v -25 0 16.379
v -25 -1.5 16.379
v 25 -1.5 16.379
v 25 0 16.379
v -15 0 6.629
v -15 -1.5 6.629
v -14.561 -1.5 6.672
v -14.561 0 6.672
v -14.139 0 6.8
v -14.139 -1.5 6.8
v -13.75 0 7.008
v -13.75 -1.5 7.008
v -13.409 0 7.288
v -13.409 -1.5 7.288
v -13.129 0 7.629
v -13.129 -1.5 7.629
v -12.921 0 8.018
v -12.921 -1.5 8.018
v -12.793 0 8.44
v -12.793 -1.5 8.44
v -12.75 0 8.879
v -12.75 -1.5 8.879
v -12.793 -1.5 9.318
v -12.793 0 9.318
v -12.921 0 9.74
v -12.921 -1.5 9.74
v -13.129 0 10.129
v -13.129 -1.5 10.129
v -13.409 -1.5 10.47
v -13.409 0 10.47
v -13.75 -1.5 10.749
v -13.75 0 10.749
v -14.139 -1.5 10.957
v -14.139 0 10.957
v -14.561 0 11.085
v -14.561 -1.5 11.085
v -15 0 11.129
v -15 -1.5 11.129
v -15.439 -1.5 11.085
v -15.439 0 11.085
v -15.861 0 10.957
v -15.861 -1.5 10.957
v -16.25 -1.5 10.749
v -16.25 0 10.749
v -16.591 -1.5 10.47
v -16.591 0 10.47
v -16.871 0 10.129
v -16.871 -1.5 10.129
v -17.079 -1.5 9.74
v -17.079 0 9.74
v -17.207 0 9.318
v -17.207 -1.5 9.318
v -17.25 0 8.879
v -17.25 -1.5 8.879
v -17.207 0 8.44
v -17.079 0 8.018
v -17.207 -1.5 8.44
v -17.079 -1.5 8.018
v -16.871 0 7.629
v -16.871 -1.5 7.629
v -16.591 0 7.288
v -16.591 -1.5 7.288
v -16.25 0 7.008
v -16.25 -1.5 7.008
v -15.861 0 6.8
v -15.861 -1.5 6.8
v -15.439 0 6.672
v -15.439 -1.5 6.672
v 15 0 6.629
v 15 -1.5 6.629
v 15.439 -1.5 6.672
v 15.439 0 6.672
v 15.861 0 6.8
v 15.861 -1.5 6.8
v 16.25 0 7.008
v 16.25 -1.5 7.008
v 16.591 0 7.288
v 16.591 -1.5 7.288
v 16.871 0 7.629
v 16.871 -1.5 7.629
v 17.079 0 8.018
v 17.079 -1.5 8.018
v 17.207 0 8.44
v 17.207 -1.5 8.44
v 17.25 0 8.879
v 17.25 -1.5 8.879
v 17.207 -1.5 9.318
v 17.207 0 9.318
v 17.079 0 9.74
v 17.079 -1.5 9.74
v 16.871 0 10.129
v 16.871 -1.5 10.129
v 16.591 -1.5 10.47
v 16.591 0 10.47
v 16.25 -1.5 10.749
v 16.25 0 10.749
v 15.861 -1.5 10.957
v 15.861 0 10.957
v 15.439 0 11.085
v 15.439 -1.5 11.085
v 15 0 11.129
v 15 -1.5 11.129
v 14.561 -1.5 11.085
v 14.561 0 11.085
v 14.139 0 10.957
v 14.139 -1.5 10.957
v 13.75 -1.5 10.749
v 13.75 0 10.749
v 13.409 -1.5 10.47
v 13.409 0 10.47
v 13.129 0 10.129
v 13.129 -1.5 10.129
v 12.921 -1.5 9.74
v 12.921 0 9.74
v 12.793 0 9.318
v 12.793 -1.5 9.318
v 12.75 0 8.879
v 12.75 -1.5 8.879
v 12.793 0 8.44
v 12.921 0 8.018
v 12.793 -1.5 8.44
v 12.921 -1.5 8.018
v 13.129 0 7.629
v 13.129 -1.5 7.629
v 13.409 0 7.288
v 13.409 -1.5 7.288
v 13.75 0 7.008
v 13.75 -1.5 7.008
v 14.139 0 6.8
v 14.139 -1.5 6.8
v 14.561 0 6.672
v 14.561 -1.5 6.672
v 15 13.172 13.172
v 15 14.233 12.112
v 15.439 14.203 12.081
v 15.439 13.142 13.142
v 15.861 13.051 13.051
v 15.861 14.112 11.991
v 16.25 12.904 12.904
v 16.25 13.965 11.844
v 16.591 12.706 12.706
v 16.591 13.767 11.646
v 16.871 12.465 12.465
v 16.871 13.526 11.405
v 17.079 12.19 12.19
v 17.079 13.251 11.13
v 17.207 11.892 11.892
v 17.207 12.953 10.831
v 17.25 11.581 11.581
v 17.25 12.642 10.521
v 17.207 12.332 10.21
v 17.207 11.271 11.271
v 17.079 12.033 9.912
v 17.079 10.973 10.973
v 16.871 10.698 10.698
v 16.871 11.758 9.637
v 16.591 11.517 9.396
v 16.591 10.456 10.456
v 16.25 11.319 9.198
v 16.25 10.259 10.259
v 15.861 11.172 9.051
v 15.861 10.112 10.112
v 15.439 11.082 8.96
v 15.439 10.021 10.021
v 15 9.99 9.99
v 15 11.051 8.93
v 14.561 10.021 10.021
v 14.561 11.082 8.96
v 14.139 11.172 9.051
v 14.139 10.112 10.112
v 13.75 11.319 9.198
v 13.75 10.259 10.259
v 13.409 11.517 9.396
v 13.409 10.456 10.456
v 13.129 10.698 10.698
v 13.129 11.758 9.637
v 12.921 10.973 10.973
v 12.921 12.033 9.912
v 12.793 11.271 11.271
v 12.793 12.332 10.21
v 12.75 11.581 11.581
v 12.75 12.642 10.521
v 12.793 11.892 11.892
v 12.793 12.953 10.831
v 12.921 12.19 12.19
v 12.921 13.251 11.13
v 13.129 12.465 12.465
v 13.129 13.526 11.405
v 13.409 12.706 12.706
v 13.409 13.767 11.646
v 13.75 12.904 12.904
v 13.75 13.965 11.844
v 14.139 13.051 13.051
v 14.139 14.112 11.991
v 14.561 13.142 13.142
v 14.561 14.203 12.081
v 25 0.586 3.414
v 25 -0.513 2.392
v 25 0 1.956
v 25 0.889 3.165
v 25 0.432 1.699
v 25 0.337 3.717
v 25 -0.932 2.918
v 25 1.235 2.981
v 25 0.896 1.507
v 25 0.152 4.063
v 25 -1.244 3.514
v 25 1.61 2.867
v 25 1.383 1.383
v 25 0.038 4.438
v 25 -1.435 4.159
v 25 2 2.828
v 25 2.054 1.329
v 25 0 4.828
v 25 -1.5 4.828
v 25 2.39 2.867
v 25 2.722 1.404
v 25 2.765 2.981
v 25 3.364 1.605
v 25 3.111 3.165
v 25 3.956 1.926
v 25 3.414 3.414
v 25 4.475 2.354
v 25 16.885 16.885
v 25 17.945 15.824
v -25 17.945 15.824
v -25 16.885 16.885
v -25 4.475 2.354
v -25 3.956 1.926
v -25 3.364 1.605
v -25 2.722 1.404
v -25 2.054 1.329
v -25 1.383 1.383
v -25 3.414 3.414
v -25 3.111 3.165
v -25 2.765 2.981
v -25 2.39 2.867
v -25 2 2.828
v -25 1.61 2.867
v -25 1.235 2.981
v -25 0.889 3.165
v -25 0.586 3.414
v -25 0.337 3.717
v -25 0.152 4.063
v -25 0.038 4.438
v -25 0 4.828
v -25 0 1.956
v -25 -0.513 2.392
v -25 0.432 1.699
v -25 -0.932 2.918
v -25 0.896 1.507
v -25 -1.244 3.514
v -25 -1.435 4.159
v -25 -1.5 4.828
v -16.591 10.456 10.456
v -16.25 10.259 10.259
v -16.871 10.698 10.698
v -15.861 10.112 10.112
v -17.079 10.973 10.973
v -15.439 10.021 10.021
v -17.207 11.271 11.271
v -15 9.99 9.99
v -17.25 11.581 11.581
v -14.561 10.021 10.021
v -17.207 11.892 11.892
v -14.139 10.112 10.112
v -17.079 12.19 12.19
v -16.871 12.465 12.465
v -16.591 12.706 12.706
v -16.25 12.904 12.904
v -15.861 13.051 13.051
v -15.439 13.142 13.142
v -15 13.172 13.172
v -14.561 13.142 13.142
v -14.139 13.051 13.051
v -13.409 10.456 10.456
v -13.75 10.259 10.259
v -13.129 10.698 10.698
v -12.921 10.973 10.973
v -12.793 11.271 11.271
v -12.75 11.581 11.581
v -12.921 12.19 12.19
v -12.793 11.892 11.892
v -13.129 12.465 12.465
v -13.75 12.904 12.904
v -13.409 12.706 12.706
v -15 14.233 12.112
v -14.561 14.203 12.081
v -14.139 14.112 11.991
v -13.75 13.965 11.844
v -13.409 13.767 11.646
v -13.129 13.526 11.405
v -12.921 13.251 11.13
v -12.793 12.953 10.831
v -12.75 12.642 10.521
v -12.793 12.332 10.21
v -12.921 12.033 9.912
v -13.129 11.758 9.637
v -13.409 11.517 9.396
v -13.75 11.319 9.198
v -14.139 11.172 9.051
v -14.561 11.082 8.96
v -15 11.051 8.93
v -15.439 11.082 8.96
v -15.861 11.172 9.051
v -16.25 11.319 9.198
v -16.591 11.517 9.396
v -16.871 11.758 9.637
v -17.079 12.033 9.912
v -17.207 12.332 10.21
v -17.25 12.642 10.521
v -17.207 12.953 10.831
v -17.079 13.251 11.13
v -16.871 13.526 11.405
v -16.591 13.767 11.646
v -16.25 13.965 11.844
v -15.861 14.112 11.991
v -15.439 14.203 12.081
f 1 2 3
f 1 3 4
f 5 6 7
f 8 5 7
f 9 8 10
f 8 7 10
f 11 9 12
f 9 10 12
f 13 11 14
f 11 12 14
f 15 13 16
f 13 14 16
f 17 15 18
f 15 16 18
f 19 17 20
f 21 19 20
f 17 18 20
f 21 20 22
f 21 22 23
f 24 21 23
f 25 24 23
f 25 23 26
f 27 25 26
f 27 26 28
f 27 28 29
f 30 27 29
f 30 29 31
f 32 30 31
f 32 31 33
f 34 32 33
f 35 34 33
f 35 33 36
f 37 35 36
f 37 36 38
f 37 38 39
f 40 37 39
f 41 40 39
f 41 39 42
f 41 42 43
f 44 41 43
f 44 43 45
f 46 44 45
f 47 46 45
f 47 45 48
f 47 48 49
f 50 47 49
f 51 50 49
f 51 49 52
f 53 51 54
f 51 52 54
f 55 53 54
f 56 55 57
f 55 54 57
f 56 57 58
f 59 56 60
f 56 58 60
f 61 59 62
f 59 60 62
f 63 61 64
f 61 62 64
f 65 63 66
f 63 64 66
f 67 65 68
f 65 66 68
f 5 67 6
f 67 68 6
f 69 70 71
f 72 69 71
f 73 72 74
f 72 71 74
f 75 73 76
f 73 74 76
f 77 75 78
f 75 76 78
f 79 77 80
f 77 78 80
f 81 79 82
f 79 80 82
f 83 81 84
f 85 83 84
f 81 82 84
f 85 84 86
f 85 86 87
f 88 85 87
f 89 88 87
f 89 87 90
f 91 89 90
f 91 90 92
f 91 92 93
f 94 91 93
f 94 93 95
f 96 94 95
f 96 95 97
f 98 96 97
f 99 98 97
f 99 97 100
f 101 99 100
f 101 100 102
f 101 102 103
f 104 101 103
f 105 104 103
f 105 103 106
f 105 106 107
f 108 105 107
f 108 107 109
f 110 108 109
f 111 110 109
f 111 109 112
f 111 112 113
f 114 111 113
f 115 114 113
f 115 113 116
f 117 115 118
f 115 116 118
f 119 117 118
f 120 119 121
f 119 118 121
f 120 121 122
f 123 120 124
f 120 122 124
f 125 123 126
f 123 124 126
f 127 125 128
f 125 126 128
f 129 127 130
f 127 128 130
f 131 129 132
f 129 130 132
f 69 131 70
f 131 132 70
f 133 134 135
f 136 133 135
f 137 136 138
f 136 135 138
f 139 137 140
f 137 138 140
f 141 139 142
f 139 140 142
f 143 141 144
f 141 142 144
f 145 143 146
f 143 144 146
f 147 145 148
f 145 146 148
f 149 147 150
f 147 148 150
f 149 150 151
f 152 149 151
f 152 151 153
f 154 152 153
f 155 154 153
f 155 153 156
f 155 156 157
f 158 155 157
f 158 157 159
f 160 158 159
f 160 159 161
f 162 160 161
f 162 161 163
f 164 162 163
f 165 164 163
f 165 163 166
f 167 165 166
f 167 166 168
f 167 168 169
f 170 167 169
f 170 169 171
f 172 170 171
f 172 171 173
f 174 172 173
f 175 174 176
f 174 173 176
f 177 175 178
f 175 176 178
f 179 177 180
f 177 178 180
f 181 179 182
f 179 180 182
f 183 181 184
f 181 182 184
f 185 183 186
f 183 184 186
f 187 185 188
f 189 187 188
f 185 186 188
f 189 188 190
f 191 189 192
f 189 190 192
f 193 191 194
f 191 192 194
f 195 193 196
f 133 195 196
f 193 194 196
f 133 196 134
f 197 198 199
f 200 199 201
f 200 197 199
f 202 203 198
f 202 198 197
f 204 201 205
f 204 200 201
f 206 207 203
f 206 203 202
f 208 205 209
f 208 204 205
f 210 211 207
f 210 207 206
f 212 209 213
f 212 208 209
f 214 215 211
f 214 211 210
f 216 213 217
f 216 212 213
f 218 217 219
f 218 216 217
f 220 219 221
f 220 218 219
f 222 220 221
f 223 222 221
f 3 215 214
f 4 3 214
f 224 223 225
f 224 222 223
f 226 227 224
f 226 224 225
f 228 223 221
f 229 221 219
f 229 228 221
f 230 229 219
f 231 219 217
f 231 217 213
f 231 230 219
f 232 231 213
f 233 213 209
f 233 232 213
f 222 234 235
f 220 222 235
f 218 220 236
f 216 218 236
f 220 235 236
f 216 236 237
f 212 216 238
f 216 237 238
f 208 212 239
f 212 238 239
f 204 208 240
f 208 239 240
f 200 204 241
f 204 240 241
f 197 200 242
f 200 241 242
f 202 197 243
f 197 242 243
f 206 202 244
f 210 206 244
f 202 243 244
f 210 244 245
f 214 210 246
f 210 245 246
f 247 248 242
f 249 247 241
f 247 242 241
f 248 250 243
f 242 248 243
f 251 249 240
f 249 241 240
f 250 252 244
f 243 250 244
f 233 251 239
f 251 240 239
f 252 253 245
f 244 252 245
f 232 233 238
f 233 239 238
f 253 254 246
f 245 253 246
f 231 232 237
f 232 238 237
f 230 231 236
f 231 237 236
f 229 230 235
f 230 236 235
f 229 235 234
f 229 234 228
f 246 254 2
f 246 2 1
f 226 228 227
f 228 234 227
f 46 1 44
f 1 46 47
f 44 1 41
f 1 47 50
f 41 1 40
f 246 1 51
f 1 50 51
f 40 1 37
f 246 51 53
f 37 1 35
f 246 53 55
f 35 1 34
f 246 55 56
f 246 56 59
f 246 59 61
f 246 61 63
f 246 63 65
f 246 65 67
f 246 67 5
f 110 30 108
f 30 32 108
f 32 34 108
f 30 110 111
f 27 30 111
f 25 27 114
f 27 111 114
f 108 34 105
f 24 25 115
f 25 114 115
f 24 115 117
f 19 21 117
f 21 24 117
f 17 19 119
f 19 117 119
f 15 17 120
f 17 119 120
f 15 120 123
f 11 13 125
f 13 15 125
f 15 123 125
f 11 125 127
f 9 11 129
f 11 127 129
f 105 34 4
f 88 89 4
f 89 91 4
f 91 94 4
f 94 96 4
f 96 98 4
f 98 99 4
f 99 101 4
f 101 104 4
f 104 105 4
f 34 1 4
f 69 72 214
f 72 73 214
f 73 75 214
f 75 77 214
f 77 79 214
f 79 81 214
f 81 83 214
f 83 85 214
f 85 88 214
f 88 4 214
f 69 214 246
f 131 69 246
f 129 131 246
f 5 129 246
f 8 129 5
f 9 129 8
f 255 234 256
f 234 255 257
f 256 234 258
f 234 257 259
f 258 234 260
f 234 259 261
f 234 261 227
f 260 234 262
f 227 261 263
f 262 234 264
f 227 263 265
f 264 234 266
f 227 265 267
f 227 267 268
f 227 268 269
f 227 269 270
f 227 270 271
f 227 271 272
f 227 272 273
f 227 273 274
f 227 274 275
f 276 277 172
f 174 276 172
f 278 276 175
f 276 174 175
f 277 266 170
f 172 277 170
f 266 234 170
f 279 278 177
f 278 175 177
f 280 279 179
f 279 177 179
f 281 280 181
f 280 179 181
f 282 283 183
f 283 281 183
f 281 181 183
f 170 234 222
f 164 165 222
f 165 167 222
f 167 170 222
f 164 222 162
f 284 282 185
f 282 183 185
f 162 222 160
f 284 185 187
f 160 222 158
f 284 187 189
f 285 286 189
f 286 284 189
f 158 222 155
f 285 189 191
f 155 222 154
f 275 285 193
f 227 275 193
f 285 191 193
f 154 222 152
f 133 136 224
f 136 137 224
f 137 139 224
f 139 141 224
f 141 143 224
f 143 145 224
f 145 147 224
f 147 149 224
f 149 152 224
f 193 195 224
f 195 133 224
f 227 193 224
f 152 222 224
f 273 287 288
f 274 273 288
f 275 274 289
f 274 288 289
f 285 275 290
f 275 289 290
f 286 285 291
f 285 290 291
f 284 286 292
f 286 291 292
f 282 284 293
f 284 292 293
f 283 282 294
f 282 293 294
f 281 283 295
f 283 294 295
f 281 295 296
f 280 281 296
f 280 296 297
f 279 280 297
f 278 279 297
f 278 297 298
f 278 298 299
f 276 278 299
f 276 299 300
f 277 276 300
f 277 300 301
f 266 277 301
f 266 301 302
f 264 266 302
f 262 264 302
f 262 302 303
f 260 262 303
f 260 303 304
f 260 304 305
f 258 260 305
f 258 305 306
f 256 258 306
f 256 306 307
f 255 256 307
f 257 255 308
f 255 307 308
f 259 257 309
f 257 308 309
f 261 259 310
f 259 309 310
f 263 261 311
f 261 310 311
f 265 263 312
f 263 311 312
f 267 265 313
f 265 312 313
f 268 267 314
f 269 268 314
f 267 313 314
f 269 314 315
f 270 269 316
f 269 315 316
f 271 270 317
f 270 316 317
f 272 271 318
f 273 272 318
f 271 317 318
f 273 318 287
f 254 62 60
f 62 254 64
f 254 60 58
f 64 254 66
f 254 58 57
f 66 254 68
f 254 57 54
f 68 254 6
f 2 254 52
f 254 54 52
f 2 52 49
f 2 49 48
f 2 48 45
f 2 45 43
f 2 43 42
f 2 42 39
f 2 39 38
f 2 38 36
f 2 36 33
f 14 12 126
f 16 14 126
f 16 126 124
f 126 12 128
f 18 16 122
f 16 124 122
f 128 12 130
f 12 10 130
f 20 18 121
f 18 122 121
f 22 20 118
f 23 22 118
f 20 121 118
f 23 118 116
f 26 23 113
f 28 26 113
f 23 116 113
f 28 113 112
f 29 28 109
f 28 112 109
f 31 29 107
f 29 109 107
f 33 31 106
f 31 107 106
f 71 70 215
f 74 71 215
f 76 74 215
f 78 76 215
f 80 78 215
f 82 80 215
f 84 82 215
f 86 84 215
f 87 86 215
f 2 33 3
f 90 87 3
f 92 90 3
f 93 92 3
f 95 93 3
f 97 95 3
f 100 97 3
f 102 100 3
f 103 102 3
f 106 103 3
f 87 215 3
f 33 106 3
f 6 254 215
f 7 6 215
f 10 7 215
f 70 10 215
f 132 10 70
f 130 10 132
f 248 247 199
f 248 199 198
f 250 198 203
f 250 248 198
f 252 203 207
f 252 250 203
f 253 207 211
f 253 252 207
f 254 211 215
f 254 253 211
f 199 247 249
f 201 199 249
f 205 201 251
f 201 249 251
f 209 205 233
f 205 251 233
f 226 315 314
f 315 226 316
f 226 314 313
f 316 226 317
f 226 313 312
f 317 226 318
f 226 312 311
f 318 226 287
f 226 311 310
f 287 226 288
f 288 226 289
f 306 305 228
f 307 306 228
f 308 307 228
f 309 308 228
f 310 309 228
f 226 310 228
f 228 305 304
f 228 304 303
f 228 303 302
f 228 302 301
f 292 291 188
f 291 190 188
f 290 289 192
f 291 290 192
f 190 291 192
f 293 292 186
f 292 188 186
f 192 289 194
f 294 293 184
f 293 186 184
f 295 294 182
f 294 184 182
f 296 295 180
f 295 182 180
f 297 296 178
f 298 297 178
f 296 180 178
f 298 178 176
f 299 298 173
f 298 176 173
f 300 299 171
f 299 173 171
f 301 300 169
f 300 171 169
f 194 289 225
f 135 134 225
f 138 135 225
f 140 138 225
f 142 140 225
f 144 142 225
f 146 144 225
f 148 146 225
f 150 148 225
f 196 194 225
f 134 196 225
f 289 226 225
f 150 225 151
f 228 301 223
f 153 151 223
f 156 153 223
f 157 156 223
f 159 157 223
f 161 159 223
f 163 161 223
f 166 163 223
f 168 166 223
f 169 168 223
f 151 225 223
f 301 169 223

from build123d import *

# Parameters (mm, degrees)
BOSS_EXTRUDE1_DEPTH    = 25
CUT_EXTRUDE1_REACH     = 37.102
SKETCH2_R              = 2.25
CUT_EXTRUDE2_REACH     = 37.892
SKETCH3_R              = 2.25
CONVERT_SOLID1_START   = -25
CONVERT_SOLID1_DEPTH   = 50
CONVERT_SOLID1_2_DEPTH = 50


# Read off the part's stored shape, not the designer's step: Convert-Solid1
with BuildPart() as part:
    # Sketch1 → Boss-Extrude1 (new, symmetric)
    with BuildSketch(Plane(origin=(0, 0, 0), x_dir=(0, 0, -1), z_dir=(1, 0, 0))):
        Polygon((0, 0), (-16.884776311, 16.884776311), (-15.824116139, 17.945436483), (3.621320344, -1.5), (-16.378679656, -1.5), (-16.378679656, 0), align=None)
    extrude(amount=BOSS_EXTRUDE1_DEPTH, both=True)

    # Sketch2 → Cut-Extrude1 (cut, up to next)
    with BuildSketch(Plane(origin=(0, 1.060660172, -1.060660172), x_dir=(1, 0, 0), z_dir=(0, 0.7071067811865513, -0.7071067811865438)), mode=Mode.PRIVATE) as cut_extrude1_sk1:
        with Locations(Location((-15, -16.378679656, 0), (0, 0, 270))):
            Circle(SKETCH2_R)
    cut_extrude1_tool1 = extrude(cut_extrude1_sk1.sketch, amount=-CUT_EXTRUDE1_REACH, mode=Mode.PRIVATE) & part.part
    # Sketch2 → Cut-Extrude1 (cut, up to next)
    with BuildSketch(Plane(origin=(0, 1.060660172, -1.060660172), x_dir=(1, 0, 0), z_dir=(0, 0.7071067811865513, -0.7071067811865438)), mode=Mode.PRIVATE) as cut_extrude1_sk2:
        with Locations(Location((15, -16.378679656, 0), (0, 0, 270))):
            Circle(SKETCH2_R)
    cut_extrude1_tool2 = extrude(cut_extrude1_sk2.sketch, amount=-CUT_EXTRUDE1_REACH, mode=Mode.PRIVATE) & part.part
    add(cut_extrude1_tool1.solids().sort_by_distance((-15, 12.642136, 10.520815))[0], mode=Mode.SUBTRACT)
    add(cut_extrude1_tool2.solids().sort_by_distance((15, 12.642136, 10.520815))[0], mode=Mode.SUBTRACT)

    # Sketch3 → Cut-Extrude2 (cut, up to next)
    with BuildSketch(Plane.XZ.offset(1.5), mode=Mode.PRIVATE) as cut_extrude2_sk1:
        with Locations(Location((-15, 8.878679656, 0), (0, 0, 270))):
            Circle(SKETCH3_R)
    cut_extrude2_tool1 = extrude(cut_extrude2_sk1.sketch, amount=-CUT_EXTRUDE2_REACH, mode=Mode.PRIVATE) & part.part
    # Sketch3 → Cut-Extrude2 (cut, up to next)
    with BuildSketch(Plane.XZ.offset(1.5), mode=Mode.PRIVATE) as cut_extrude2_sk2:
        with Locations(Location((15, 8.878679656, 0), (0, 0, 270))):
            Circle(SKETCH3_R)
    cut_extrude2_tool2 = extrude(cut_extrude2_sk2.sketch, amount=-CUT_EXTRUDE2_REACH, mode=Mode.PRIVATE) & part.part
    add(cut_extrude2_tool1.solids().sort_by_distance((-15, -1.5, 8.87868))[0], mode=Mode.SUBTRACT)
    add(cut_extrude2_tool2.solids().sort_by_distance((15, -1.5, 8.87868))[0], mode=Mode.SUBTRACT)

    # Convert-Solid1 outline → Convert-Solid1 (cut)
    with BuildSketch(Plane.YZ.offset(CONVERT_SOLID1_START)):
        with BuildLine():
            Line((-1.5, -3.621320344), (4.474873734, 2.353553391))
            ThreePointArc((4.474873734, 2.353553391), (3.048097173, 1.489042104), (1.383203961, 1.383203961))
            Line((1.383203961, 1.383203961), (0, 0))
            Line((0, 0), (0, 1.956145802))
            ThreePointArc((0, 1.956145802), (-1.102418412, 3.20824195), (-1.5, 4.828427125))
            Line((-1.5, 4.828427125), (-1.5, -3.621320344))
        make_face()
    extrude(amount=CONVERT_SOLID1_DEPTH, mode=Mode.SUBTRACT)

    # Convert-Solid1 2 outline → Convert-Solid1 2 (add)
    with BuildSketch(Plane.YZ.offset(CONVERT_SOLID1_START)):
        with BuildLine():
            ThreePointArc((0, 1.956145802), (0.660607987, 1.594848761), (1.383203961, 1.383203961))
            Line((1.383203961, 1.383203961), (3.414213562, 3.414213562))
            ThreePointArc((3.414213562, 3.414213562), (1.234633135, 2.98066806), (0, 4.828427125))
            Line((0, 4.828427125), (0, 1.956145802))
        make_face()
    extrude(amount=CONVERT_SOLID1_2_DEPTH)


solid = part.part
